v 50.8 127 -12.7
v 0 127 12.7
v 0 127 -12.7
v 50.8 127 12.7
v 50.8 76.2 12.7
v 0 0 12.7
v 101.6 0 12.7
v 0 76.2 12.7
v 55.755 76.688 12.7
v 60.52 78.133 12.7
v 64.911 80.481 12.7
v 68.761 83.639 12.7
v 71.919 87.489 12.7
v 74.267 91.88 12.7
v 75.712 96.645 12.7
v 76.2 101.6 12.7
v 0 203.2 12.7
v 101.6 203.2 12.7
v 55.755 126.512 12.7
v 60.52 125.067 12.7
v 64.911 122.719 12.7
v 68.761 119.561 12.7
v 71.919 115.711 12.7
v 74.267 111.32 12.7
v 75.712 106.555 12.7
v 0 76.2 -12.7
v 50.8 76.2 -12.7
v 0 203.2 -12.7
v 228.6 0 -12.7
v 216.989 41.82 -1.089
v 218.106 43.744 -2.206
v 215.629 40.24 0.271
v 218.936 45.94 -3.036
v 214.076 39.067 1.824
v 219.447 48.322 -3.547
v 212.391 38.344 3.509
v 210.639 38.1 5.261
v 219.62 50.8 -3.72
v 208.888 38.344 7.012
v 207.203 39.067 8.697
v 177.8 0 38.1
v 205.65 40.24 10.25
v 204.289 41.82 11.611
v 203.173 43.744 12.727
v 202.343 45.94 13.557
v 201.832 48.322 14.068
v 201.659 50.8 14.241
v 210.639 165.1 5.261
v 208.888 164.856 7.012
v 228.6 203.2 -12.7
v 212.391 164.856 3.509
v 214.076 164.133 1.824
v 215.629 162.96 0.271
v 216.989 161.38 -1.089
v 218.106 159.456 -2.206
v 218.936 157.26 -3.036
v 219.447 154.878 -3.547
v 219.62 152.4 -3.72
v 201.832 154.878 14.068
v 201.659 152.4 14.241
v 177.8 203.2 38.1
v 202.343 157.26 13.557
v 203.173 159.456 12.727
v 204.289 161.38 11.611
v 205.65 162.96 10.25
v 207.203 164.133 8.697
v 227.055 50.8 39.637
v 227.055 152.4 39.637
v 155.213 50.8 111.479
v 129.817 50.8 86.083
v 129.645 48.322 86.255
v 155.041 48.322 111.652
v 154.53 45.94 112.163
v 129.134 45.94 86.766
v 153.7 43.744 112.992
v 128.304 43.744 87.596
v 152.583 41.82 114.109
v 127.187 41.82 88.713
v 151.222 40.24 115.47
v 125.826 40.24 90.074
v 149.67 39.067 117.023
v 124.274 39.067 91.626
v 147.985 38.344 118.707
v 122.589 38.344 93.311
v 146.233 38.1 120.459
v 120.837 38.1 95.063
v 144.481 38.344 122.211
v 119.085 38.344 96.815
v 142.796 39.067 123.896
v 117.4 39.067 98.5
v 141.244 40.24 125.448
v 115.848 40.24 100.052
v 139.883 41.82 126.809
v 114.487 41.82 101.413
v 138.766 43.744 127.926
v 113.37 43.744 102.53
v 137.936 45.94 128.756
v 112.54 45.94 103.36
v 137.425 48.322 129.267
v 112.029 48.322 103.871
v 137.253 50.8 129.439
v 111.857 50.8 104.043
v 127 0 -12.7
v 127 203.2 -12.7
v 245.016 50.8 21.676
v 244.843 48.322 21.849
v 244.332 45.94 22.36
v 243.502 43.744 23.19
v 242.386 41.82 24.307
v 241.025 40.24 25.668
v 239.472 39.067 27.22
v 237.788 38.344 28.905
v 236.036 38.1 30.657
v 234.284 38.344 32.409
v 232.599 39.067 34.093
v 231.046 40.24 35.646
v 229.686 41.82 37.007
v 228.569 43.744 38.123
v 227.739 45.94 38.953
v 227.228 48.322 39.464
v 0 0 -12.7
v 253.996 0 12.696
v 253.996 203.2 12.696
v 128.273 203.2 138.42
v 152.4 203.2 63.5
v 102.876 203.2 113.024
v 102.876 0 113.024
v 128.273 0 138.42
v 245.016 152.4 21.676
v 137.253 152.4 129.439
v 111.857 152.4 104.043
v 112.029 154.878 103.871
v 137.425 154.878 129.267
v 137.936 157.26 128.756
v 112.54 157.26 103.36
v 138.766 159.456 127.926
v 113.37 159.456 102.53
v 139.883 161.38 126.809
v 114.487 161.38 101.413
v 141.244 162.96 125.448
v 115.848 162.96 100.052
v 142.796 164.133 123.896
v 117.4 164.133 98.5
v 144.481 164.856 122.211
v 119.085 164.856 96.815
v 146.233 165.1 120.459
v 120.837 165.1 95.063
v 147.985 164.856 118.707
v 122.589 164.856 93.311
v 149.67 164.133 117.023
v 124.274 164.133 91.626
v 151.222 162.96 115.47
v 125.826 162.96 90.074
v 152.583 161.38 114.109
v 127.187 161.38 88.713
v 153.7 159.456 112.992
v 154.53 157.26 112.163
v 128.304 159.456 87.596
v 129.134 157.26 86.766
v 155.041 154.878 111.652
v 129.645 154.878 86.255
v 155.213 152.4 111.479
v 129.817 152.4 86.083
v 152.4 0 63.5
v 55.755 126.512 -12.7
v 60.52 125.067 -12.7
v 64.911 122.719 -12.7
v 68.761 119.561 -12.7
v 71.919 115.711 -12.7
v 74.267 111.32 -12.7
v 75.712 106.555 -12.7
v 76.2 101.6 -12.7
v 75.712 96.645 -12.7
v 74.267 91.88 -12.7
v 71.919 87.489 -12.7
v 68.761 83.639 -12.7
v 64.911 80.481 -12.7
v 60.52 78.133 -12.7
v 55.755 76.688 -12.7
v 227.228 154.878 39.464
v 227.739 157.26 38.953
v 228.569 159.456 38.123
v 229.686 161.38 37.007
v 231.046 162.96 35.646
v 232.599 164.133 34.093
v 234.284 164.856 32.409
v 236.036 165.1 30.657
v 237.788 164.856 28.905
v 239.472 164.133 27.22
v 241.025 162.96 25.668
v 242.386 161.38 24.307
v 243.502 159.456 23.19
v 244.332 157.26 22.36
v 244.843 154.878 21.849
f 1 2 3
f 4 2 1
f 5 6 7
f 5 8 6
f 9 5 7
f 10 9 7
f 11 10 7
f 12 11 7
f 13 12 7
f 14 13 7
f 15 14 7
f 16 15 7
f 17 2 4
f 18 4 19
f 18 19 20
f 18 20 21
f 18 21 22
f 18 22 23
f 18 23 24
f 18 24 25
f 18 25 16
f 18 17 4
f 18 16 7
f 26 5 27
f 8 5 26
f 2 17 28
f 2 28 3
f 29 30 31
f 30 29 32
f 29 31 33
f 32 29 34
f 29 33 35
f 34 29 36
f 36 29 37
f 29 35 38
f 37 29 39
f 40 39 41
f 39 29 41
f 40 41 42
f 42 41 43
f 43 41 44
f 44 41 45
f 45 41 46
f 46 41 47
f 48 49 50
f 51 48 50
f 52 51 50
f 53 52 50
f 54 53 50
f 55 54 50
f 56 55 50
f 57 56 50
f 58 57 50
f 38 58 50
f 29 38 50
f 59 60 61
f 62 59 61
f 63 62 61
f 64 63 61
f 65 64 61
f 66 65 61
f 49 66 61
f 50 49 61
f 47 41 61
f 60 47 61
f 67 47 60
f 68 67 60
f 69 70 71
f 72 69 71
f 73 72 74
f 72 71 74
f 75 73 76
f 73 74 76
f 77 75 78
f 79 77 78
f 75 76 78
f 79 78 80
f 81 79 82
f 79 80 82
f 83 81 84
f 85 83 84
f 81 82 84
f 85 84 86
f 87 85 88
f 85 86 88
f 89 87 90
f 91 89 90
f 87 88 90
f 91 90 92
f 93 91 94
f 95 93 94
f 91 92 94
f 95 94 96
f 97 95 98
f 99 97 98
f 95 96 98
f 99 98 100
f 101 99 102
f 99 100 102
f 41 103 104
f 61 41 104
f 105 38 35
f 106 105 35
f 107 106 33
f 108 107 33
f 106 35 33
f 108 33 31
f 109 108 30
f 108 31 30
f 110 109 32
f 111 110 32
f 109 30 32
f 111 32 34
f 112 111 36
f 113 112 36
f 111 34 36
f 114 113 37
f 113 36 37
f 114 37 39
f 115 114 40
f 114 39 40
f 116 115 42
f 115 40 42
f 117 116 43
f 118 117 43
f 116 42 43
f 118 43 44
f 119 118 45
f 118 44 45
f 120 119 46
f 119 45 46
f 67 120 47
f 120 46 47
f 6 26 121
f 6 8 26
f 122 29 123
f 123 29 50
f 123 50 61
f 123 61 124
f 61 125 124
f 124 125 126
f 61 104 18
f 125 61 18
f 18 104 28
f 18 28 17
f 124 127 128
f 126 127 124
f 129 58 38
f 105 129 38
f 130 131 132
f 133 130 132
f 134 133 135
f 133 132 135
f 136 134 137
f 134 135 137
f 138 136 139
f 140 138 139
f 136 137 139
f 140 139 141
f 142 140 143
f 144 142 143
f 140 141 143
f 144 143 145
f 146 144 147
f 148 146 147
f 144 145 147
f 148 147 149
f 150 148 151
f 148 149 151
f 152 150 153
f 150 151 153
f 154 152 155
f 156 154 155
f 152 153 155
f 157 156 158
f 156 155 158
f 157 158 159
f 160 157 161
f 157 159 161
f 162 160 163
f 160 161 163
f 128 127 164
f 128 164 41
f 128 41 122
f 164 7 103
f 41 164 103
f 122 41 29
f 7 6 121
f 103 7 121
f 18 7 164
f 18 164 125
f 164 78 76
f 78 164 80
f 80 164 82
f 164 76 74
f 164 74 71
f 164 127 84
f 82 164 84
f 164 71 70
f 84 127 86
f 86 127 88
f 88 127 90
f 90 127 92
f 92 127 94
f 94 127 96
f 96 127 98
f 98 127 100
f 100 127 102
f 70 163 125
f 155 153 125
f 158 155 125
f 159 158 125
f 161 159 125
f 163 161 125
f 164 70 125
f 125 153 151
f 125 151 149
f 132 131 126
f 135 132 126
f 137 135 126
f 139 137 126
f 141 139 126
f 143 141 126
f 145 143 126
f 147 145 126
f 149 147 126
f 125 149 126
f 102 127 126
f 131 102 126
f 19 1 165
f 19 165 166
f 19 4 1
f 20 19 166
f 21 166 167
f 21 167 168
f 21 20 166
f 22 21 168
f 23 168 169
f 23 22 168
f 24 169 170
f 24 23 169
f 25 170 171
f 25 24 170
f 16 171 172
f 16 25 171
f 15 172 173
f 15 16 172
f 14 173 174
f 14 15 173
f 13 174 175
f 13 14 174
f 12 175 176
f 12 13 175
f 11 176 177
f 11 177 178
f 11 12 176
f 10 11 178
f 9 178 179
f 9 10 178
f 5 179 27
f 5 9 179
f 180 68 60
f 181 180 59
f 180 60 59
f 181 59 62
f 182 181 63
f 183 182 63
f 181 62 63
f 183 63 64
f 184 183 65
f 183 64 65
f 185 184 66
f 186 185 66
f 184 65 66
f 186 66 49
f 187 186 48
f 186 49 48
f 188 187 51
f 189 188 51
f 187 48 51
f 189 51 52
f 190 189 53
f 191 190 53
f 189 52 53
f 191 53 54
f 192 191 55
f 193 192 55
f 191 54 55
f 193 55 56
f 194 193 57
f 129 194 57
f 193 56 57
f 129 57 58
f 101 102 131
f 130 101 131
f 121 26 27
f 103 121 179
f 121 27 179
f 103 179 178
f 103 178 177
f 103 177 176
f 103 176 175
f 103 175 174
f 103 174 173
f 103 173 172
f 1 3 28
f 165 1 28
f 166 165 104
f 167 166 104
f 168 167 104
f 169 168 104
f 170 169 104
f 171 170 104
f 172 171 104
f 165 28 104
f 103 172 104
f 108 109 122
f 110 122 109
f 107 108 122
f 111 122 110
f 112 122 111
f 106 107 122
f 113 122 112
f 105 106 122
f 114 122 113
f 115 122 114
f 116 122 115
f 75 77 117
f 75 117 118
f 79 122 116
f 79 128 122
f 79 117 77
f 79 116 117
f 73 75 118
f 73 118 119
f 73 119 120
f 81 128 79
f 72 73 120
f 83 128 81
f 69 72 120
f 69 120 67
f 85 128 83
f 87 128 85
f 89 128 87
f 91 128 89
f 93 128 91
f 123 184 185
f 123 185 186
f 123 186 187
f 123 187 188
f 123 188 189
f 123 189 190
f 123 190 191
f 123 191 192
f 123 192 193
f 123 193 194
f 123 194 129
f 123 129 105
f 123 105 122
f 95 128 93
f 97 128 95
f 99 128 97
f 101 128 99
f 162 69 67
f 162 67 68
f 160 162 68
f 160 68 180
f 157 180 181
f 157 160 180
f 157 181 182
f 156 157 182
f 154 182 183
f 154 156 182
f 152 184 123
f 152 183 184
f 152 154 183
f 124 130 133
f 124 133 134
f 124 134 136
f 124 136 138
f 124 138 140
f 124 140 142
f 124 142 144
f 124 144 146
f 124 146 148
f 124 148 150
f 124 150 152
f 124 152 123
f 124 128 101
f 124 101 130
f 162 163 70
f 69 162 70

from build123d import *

# Parameters (mm, degrees)
F1_DEPTH = 12.7
F2_SIZE  = 25.39999
F3_DEPTH = 71.8420489686
F4_W     = 203.2
F4_H     = 70.0369336182
F4_H_2   = 71.8420560396
F4_H_3   = 35.9210103421
F5_DEPTH = 35.9156


# Not quite as in the source:
# - a fillet or chamfer is up to 0.001 mm smaller than in the source, because OpenCascade refuses the exact size


with BuildPart() as f1:
    # F0 (on Top) → F1 (new body, symmetric)
    with BuildSketch(Plane.XY):
        with BuildLine():
            Line((0, 76.2), (0, 0))
            Line((0, 0), (127, 0))
            Line((127, 0), (127, 203.2))
            Line((127, 203.2), (0, 203.2))
            Line((0, 203.2), (0, 127))
            Line((0, 127), (50.8, 127))
            ThreePointArc((50.8, 127), (76.2, 101.6), (50.8, 76.2))
            Line((50.8, 76.2), (0, 76.2))
        make_face()
    extrude(amount=F1_DEPTH, both=True)

    # F2 (size 25.4 in the source; OpenCascade refuses exactly that, so slightly less here)
    f2_edges = [f1.edges().sort_by_distance(p)[0] for p in [
        (127, 101.6, 12.7),
    ]]
    chamfer(f2_edges, length=F2_SIZE)

    # F3 (add): a face of the model
    f3_faces = [f1.faces().sort_by_distance(p)[0] for p in [
        (114.300005, 101.6, 5e-06),
    ]]
    extrude(f3_faces, amount=F3_DEPTH)

    # F4 (on face) → F5 (join)
    with BuildSketch(Plane(origin=(107.95, 0, 107.95), x_dir=(0, 1, 0), z_dir=(0.7071067812, 0, 0.7071067812))):
        with Locations((101.6, -27.8433331094)):
            Rectangle(F4_W, F4_H)
        with BuildLine():
            ThreePointArc((50.8, -30.9248663003), (38.1, -18.2248663003), (50.8, -5.5248663003))
            Line((50.8, -5.5248663003), (152.4, -5.5248663003))
            ThreePointArc((152.4, -5.5248663003), (165.1, -18.2248663003), (152.4, -30.9248663003))
            Line((152.4, -30.9248663003), (50.8, -30.9248663003))
        make_face(mode=Mode.SUBTRACT)
        with Locations((101.6, -134.7038382805)):
            Rectangle(F4_W, F4_H_2)
        with BuildLine():
            ThreePointArc((50.8, -157.9248663003), (38.1, -145.2248663003), (50.8, -132.5248663003))
            Line((50.8, -132.5248663003), (152.4, -132.5248663003))
            ThreePointArc((152.4, -132.5248663003), (165.1, -145.2248663003), (152.4, -157.9248663003))
            Line((152.4, -157.9248663003), (50.8, -157.9248663003))
        make_face(mode=Mode.SUBTRACT)
        with Locations((101.6, -80.8223050896)):
            Rectangle(F4_W, F4_H_3)
    extrude(amount=F5_DEPTH)


solid = f1.part
